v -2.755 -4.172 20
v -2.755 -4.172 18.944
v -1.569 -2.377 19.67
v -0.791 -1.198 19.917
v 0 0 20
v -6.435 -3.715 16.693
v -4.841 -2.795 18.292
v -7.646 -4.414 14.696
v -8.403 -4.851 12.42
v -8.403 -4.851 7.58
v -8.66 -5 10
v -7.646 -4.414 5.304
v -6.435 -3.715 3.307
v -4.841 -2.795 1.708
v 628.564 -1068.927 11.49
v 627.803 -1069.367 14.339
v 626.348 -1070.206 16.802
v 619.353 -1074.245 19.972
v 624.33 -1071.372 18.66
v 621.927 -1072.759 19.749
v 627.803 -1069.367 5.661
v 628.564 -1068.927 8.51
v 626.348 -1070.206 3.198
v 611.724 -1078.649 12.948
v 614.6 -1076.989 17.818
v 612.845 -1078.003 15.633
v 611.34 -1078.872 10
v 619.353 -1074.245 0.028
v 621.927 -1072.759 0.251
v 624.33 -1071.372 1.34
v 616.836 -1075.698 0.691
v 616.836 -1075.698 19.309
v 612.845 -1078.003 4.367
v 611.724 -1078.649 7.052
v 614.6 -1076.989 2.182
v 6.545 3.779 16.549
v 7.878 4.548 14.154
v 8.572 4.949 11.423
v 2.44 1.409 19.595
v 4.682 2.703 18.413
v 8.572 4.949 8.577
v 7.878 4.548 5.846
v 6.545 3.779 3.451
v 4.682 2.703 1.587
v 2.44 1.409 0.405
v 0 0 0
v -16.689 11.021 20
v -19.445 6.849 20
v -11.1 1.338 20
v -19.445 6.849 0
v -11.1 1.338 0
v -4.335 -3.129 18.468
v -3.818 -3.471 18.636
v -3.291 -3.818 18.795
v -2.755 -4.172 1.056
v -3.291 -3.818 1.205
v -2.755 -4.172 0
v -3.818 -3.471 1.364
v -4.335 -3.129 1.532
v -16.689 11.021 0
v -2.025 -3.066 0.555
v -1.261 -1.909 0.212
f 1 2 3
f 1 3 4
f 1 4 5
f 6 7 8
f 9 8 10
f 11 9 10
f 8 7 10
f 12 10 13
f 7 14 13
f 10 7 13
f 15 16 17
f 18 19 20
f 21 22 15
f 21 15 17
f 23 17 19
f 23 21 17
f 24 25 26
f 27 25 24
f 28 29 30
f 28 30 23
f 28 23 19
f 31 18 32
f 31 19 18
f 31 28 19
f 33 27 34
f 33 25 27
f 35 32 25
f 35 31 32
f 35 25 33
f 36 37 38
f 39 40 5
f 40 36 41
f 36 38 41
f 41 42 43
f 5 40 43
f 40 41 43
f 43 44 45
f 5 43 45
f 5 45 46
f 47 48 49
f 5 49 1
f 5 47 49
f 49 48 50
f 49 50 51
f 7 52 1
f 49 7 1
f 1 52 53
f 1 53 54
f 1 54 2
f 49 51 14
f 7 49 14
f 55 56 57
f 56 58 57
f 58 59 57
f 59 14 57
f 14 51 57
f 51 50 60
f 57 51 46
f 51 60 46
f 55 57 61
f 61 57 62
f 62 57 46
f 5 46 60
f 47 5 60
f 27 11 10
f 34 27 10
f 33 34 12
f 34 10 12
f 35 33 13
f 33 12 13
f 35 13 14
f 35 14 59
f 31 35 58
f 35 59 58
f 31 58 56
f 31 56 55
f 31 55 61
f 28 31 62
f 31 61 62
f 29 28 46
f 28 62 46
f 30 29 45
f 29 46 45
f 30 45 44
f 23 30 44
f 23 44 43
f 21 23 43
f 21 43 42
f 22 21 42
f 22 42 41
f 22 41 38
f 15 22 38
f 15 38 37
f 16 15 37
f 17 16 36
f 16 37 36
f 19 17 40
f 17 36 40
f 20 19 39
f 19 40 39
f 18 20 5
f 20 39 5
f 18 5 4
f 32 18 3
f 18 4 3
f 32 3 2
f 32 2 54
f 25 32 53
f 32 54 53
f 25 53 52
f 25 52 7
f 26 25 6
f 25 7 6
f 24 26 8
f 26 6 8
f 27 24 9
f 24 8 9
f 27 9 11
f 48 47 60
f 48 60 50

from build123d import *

# Parameters (mm, degrees)
BOSS_EXTRUDE1_DEPTH = 20
SKETCH3_R           = 10
BOSS_EXTRUDE2_DEPTH = 1240


with BuildPart() as part:
    # Sketch1 → Boss-Extrude1 (new body)
    with BuildSketch(Plane.XY):
        Polygon((0, 0), (-16.689267036, 11.021268793), (-19.444584234, 6.848952034), (-11.099950716, 1.338317638), (-2.755317198, -4.172316759), align=None)
    extrude(amount=BOSS_EXTRUDE1_DEPTH)

    # Sketch3 → Boss-Extrude2 (add)
    with BuildSketch(Plane(origin=(0, 0, 0), x_dir=(-0.8660254037844396, -0.4999999999999985, 0), z_dir=(0.4999999999999985, -0.8660254037844396, 0))):
        with Locations((0, -10)):
            Circle(SKETCH3_R)
    extrude(amount=BOSS_EXTRUDE2_DEPTH)


solid = part.part
